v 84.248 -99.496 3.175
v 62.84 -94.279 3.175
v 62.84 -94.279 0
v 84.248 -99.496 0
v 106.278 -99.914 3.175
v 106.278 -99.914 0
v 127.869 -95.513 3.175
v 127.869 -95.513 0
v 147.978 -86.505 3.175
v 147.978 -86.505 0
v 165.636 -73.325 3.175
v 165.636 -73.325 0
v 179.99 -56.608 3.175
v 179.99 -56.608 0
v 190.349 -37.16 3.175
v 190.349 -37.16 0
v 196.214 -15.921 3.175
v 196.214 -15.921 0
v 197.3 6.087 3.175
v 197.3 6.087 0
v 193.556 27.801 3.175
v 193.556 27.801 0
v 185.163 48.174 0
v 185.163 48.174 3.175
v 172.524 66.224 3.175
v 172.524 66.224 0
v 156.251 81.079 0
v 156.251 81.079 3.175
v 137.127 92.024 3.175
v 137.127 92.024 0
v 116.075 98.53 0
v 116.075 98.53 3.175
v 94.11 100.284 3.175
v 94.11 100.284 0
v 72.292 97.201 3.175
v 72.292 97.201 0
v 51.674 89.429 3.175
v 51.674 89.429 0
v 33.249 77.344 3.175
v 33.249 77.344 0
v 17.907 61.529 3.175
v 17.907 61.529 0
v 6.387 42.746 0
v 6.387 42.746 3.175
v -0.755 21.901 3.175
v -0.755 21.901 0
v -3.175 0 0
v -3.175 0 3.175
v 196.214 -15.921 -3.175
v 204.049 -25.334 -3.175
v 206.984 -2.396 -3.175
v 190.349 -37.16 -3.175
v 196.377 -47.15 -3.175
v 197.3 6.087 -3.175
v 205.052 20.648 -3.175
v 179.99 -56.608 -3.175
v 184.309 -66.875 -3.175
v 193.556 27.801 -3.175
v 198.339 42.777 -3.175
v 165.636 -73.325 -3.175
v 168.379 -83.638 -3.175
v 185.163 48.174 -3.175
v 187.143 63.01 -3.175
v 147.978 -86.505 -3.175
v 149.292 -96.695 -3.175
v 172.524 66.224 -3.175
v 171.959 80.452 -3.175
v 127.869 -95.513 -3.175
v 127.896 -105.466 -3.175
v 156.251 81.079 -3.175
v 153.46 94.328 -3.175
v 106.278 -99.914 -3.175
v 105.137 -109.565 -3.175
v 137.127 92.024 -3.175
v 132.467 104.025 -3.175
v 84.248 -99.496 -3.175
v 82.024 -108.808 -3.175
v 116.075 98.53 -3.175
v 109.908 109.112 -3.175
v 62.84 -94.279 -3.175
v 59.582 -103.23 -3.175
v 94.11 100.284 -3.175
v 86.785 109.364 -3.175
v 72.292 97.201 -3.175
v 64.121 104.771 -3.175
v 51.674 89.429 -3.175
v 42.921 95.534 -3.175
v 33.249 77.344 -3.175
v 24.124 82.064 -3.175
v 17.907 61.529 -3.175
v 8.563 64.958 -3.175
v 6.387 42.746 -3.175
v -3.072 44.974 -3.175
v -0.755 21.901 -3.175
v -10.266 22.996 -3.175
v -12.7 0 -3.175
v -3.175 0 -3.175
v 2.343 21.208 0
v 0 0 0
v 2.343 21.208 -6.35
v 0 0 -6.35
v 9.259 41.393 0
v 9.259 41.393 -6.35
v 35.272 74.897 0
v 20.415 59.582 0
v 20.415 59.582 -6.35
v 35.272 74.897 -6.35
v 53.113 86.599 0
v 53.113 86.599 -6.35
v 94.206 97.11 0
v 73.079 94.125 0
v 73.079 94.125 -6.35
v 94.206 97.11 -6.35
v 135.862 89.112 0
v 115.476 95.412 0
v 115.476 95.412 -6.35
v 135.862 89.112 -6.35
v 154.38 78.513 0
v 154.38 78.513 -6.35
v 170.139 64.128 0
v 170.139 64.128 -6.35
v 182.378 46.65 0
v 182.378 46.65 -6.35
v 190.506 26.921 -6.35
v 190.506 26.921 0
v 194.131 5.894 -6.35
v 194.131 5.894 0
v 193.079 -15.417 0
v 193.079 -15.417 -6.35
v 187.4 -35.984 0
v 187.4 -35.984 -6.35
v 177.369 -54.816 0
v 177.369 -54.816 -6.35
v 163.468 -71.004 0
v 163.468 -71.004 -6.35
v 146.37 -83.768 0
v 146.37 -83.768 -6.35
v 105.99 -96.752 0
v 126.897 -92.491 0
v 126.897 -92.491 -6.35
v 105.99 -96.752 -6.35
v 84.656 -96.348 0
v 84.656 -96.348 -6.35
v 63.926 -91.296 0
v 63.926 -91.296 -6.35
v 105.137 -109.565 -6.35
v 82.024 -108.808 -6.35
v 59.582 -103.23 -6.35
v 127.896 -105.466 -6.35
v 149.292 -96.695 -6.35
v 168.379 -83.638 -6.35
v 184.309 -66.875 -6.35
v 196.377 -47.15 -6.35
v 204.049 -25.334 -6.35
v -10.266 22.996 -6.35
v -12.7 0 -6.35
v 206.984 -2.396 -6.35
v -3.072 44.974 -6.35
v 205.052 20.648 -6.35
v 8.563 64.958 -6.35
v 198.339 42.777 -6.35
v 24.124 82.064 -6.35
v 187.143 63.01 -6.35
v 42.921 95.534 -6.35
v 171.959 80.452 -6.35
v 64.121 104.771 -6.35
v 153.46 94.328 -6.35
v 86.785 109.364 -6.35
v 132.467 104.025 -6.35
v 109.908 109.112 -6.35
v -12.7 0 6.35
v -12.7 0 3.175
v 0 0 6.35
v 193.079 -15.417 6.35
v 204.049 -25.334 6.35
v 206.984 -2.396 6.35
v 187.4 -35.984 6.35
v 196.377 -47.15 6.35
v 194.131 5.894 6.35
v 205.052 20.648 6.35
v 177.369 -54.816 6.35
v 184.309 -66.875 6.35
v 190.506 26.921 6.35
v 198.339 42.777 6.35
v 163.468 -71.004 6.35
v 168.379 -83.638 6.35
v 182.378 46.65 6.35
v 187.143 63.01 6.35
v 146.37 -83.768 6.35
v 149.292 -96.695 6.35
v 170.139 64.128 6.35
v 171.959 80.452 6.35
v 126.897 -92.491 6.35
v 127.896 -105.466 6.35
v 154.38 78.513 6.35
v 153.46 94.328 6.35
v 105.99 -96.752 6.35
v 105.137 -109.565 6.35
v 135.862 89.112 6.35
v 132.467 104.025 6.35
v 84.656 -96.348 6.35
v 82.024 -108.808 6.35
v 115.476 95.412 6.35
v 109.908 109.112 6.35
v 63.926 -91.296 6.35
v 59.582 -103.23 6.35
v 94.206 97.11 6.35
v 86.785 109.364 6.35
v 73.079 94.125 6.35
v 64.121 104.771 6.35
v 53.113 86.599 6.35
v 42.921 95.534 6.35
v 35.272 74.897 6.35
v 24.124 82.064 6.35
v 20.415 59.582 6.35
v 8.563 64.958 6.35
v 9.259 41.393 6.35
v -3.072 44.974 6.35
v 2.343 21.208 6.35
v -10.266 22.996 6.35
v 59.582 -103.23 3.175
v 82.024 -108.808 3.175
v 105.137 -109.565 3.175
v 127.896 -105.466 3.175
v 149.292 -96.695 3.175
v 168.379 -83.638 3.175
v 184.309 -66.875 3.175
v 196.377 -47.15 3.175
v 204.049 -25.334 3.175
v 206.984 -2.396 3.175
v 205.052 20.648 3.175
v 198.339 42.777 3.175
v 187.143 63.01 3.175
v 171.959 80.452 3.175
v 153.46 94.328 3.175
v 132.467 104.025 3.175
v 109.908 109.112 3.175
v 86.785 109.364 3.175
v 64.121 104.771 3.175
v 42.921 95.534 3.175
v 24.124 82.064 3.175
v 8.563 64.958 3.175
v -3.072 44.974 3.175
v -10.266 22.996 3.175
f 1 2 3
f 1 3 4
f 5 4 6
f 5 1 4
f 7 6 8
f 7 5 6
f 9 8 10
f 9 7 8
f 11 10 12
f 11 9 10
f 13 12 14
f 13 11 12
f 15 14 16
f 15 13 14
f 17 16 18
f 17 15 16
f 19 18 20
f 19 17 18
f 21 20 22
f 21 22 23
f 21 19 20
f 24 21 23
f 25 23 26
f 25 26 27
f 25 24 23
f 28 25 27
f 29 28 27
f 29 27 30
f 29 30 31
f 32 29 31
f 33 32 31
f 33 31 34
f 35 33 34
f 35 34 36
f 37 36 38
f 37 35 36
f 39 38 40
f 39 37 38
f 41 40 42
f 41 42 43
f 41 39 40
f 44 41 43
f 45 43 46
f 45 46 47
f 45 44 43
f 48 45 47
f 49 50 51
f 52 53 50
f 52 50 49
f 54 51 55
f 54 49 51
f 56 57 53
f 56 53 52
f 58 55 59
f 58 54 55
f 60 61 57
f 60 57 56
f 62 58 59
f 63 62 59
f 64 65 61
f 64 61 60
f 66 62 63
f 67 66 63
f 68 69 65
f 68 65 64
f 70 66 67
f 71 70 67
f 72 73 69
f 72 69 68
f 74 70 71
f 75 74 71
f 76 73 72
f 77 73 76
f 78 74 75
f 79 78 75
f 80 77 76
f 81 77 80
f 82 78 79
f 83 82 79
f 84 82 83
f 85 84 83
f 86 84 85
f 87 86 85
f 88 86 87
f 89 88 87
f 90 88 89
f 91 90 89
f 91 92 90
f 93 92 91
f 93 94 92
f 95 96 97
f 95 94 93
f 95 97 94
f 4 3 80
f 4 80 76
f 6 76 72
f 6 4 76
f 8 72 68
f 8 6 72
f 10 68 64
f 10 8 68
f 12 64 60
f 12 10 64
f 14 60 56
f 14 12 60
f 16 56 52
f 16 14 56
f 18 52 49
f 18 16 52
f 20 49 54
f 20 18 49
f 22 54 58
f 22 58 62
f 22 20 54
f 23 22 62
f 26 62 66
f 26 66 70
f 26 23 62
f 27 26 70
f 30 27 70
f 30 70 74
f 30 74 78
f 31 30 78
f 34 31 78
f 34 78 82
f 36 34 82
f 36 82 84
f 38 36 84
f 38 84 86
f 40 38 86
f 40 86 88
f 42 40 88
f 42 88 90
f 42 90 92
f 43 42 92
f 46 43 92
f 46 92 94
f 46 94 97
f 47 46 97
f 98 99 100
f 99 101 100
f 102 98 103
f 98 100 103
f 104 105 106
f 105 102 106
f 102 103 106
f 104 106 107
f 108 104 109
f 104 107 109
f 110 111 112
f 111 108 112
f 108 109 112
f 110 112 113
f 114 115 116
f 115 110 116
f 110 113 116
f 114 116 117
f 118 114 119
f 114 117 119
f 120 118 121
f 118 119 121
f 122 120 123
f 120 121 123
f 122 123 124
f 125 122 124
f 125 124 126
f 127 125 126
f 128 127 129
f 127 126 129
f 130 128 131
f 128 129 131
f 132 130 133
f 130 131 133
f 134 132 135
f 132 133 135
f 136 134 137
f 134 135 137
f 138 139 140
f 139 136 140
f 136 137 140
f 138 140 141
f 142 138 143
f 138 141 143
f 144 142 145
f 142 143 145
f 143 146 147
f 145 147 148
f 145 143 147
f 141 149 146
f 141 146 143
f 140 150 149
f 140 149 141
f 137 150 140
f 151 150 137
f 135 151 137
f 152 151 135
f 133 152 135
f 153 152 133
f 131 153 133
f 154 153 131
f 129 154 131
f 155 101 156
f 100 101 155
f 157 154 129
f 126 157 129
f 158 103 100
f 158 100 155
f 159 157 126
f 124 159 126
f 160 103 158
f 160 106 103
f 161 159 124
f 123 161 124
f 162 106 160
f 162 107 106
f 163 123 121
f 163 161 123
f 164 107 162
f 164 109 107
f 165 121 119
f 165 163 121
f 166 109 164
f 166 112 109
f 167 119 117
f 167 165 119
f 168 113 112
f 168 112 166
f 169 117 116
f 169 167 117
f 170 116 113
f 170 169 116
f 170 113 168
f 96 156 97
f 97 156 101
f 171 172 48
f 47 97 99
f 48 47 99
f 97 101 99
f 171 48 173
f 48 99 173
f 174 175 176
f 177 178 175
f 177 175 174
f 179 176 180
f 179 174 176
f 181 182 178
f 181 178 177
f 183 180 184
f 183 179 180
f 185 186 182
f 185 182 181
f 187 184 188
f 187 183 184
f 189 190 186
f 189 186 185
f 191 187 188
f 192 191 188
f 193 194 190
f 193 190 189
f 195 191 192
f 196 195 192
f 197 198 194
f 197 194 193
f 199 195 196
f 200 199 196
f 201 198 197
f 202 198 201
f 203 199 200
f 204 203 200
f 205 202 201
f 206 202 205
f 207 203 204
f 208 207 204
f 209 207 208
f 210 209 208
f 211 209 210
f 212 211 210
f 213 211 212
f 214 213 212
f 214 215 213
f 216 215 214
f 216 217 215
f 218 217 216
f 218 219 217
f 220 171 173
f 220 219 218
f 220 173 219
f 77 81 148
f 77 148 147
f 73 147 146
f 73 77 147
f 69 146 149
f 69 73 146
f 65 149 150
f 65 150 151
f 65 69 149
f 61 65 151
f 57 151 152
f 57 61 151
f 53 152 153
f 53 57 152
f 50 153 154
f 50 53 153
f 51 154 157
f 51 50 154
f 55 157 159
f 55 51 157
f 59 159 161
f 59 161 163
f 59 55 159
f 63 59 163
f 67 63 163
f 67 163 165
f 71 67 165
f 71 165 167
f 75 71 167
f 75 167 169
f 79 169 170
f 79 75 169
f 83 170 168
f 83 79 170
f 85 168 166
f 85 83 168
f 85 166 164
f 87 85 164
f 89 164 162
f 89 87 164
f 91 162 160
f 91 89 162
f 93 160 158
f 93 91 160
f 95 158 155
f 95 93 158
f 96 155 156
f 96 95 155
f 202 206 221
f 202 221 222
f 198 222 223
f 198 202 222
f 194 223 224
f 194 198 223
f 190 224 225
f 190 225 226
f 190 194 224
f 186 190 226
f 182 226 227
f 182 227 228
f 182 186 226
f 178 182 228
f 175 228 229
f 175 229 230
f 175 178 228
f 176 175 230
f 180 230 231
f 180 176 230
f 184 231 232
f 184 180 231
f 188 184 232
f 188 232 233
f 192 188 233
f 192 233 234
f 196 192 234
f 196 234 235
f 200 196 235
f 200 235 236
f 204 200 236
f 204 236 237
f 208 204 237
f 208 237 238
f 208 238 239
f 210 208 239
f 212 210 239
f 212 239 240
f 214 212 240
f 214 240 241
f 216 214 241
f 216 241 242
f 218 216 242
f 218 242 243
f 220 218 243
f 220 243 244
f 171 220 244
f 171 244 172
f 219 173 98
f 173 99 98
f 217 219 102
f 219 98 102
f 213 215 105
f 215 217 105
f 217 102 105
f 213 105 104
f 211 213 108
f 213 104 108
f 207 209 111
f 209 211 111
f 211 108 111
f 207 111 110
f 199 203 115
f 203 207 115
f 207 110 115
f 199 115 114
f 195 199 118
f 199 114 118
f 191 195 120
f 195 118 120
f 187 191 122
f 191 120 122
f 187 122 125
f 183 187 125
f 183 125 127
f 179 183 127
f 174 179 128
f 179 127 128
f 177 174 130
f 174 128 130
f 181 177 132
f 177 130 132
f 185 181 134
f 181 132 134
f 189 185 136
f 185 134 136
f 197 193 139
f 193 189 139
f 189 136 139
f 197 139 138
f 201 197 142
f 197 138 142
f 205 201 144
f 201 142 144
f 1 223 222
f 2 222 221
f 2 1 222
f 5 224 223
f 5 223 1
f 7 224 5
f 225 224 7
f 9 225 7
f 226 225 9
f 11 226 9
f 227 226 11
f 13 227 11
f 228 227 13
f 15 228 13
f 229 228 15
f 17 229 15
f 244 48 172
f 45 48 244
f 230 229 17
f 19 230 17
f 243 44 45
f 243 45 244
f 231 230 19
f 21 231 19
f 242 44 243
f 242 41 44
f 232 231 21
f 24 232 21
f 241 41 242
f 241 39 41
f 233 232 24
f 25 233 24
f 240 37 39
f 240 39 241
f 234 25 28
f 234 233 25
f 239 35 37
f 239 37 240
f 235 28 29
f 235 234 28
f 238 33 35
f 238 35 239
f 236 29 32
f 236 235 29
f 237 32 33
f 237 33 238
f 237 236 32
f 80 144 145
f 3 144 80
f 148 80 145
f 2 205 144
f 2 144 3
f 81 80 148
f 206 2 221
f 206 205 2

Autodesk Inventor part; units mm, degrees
ref_plane "YZ Plane" through (0, 0, 0) normal (1, 0, 0) x (0, 1, 0)
ref_plane "XZ Plane" through (0, 0, 0) normal (0, 1, 0) x (-1, 0, 0)
ref_plane "XY Plane" through (0, 0, 0) normal (0, 0, 1) x (1, 0, 0)
sketch "Sketch1" plane through (0, 0, 0) normal (0, 1, 0) x (-1, 0, 0)
  line L0 (0, 0) -> (0, 6.35)
  line L1 (0, 6.35) -> (12.7, 6.35)
  line L2 (12.7, 6.35) -> (12.7, 3.175)
  line L3 (12.7, 3.175) -> (3.175, 3.175)
  line L4 (15.24, 0) -> (-2.54, 0) construction
  line L5 (3.175, 3.175) -> (3.175, 0)
  line L6 (0, 0) -> (0, -6.35)
  line L7 (0, -6.35) -> (12.7, -6.35)
  line L8 (12.7, -6.35) -> (12.7, -3.175)
  line L9 (12.7, -3.175) -> (3.175, -3.175)
  line L10 (3.175, -3.175) -> (3.175, 0)
  dimension "d0" = 6.35
  dimension "d1" = 3.175
  dimension "d2" = 12.7
  dimension "d3" = 3.175
sketch "Sketch2" plane through (0, 0, 0) normal (0, 0, 1) x (1, 0, 0)
  line L0 (-75.0085, 0) -> (283.7112, 0) projected
  arc A0 (63.926, -91.2958) -> (0, 0) centre (97.155, 0) ccw
  line L1 (97.155, 0) -> (63.926, -91.2958) construction
  dimension "d4" = 194.31
  dimension "d6" = 70
sweep "Sweep1" add profiles "Sketch1" path "Sketch2" path curves A0
properties part number "3510K4"
